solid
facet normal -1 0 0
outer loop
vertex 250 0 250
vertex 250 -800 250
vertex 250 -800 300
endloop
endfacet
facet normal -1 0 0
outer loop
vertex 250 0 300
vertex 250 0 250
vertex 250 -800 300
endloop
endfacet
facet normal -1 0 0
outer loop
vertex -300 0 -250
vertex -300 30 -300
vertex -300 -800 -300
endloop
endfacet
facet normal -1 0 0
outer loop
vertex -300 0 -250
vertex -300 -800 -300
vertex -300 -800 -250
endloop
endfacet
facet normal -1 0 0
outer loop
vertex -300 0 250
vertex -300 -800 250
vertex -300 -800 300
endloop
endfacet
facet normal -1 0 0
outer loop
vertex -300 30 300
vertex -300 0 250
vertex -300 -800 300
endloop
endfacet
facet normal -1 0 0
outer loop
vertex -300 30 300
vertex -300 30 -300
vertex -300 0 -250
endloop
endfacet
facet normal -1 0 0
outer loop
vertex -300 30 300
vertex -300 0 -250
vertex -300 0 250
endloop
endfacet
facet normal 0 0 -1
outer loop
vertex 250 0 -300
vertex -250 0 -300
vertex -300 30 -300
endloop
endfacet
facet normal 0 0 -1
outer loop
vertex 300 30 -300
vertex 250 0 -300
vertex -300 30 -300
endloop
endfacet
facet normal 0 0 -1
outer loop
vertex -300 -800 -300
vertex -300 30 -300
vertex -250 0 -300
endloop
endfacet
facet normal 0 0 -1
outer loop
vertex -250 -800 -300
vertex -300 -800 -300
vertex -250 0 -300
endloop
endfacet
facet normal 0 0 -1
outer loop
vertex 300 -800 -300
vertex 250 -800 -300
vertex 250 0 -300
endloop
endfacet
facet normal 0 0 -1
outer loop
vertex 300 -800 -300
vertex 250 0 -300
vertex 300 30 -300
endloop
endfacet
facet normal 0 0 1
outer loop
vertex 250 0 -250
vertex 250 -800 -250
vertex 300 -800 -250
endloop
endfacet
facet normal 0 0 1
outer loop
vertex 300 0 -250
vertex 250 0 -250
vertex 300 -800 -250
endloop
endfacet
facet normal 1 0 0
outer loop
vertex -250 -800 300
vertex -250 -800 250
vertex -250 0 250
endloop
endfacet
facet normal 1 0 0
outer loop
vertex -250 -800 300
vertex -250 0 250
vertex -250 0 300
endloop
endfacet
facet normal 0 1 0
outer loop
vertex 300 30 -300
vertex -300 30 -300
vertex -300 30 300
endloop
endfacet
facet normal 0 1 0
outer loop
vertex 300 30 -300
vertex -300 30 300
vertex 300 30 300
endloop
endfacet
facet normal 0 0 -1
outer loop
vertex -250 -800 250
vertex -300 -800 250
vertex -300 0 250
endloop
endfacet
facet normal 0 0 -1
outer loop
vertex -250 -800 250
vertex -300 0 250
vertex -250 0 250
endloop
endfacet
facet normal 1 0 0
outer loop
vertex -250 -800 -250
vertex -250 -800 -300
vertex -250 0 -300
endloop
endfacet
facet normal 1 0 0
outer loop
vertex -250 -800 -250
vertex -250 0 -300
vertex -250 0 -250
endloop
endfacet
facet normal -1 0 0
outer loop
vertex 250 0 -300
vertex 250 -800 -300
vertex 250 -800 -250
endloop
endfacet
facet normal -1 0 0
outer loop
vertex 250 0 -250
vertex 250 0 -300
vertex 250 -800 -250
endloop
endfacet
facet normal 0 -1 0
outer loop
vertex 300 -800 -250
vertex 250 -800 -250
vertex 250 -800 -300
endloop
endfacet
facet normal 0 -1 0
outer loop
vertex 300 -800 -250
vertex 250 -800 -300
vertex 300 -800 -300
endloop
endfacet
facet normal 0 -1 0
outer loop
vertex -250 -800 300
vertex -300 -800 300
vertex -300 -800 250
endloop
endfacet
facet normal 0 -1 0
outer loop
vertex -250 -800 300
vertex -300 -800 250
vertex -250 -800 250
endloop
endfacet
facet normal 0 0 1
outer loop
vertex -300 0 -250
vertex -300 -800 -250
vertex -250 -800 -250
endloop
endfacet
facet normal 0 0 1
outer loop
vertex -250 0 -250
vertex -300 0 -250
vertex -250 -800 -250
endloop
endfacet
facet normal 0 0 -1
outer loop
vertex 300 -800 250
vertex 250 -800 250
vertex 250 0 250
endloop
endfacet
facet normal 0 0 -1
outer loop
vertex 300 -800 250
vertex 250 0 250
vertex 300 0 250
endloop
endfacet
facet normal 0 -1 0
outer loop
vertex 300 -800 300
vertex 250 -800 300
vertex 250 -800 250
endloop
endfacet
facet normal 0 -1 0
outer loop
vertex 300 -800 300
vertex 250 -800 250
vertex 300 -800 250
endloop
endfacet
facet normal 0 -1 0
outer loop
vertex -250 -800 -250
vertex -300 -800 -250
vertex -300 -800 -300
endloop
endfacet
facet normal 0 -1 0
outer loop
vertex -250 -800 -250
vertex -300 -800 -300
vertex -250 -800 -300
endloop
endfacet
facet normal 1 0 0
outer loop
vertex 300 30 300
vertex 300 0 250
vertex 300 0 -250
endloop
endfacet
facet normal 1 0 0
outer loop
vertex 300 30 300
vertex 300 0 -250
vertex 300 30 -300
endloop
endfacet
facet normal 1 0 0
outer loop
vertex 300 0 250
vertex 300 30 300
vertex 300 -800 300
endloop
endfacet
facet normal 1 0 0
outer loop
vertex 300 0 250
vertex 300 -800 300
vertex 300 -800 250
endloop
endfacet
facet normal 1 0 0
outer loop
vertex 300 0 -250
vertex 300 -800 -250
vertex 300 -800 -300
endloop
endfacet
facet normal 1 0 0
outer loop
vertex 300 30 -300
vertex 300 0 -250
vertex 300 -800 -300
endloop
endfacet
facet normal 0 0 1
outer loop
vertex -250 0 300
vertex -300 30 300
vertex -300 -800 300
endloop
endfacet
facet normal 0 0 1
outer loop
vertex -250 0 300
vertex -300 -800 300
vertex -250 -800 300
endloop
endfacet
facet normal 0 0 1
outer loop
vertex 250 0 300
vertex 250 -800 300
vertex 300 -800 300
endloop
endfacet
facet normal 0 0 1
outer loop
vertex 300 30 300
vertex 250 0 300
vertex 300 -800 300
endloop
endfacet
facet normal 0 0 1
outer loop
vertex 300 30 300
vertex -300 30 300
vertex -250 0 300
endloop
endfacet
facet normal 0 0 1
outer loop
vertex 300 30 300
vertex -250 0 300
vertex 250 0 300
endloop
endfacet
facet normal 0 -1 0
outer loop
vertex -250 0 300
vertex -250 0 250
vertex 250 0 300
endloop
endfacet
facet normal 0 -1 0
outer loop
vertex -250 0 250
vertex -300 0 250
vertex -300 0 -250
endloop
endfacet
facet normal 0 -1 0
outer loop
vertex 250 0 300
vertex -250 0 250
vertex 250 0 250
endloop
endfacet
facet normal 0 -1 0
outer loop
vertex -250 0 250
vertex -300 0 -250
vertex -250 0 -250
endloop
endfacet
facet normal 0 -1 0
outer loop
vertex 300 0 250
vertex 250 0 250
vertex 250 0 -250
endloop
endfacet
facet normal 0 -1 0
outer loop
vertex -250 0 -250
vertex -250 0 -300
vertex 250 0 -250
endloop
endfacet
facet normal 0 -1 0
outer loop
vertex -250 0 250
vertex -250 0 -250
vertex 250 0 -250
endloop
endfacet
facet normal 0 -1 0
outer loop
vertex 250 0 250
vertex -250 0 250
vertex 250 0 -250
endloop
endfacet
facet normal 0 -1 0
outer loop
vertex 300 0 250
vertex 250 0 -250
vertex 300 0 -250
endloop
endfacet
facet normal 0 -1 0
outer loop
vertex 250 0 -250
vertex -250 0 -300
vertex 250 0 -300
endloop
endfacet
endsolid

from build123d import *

# Parameters (mm, degrees)
SKETCH_1_W      = 600
SKETCH_1_H      = 600
EXTRUDE_1_DEPTH = 30
SKETCH_2_W      = 50
SKETCH_2_H      = 50
EXTRUDE_2_DEPTH = 800


with BuildPart() as part:
    # 草图1 → 凸台-拉伸1 (new body)
    with BuildSketch(Plane(origin=(0, 0, 0), x_dir=(1, 0, 0), z_dir=(0, 1, 0))):
        Rectangle(SKETCH_1_W, SKETCH_1_H)
    extrude(amount=EXTRUDE_1_DEPTH)

    # 草图2 → 凸台-拉伸2 (add)
    with BuildSketch(Plane.XZ):
        with Locations((-275, 275)):
            Rectangle(SKETCH_2_W, SKETCH_2_H)
        with Locations((275, 275)):
            Rectangle(SKETCH_2_W, SKETCH_2_H)
        with Locations((275, -275)):
            Rectangle(SKETCH_2_W, SKETCH_2_H)
        with Locations((-275, -275)):
            Rectangle(SKETCH_2_W, SKETCH_2_H)
    extrude(amount=EXTRUDE_2_DEPTH)


solid = part.part
